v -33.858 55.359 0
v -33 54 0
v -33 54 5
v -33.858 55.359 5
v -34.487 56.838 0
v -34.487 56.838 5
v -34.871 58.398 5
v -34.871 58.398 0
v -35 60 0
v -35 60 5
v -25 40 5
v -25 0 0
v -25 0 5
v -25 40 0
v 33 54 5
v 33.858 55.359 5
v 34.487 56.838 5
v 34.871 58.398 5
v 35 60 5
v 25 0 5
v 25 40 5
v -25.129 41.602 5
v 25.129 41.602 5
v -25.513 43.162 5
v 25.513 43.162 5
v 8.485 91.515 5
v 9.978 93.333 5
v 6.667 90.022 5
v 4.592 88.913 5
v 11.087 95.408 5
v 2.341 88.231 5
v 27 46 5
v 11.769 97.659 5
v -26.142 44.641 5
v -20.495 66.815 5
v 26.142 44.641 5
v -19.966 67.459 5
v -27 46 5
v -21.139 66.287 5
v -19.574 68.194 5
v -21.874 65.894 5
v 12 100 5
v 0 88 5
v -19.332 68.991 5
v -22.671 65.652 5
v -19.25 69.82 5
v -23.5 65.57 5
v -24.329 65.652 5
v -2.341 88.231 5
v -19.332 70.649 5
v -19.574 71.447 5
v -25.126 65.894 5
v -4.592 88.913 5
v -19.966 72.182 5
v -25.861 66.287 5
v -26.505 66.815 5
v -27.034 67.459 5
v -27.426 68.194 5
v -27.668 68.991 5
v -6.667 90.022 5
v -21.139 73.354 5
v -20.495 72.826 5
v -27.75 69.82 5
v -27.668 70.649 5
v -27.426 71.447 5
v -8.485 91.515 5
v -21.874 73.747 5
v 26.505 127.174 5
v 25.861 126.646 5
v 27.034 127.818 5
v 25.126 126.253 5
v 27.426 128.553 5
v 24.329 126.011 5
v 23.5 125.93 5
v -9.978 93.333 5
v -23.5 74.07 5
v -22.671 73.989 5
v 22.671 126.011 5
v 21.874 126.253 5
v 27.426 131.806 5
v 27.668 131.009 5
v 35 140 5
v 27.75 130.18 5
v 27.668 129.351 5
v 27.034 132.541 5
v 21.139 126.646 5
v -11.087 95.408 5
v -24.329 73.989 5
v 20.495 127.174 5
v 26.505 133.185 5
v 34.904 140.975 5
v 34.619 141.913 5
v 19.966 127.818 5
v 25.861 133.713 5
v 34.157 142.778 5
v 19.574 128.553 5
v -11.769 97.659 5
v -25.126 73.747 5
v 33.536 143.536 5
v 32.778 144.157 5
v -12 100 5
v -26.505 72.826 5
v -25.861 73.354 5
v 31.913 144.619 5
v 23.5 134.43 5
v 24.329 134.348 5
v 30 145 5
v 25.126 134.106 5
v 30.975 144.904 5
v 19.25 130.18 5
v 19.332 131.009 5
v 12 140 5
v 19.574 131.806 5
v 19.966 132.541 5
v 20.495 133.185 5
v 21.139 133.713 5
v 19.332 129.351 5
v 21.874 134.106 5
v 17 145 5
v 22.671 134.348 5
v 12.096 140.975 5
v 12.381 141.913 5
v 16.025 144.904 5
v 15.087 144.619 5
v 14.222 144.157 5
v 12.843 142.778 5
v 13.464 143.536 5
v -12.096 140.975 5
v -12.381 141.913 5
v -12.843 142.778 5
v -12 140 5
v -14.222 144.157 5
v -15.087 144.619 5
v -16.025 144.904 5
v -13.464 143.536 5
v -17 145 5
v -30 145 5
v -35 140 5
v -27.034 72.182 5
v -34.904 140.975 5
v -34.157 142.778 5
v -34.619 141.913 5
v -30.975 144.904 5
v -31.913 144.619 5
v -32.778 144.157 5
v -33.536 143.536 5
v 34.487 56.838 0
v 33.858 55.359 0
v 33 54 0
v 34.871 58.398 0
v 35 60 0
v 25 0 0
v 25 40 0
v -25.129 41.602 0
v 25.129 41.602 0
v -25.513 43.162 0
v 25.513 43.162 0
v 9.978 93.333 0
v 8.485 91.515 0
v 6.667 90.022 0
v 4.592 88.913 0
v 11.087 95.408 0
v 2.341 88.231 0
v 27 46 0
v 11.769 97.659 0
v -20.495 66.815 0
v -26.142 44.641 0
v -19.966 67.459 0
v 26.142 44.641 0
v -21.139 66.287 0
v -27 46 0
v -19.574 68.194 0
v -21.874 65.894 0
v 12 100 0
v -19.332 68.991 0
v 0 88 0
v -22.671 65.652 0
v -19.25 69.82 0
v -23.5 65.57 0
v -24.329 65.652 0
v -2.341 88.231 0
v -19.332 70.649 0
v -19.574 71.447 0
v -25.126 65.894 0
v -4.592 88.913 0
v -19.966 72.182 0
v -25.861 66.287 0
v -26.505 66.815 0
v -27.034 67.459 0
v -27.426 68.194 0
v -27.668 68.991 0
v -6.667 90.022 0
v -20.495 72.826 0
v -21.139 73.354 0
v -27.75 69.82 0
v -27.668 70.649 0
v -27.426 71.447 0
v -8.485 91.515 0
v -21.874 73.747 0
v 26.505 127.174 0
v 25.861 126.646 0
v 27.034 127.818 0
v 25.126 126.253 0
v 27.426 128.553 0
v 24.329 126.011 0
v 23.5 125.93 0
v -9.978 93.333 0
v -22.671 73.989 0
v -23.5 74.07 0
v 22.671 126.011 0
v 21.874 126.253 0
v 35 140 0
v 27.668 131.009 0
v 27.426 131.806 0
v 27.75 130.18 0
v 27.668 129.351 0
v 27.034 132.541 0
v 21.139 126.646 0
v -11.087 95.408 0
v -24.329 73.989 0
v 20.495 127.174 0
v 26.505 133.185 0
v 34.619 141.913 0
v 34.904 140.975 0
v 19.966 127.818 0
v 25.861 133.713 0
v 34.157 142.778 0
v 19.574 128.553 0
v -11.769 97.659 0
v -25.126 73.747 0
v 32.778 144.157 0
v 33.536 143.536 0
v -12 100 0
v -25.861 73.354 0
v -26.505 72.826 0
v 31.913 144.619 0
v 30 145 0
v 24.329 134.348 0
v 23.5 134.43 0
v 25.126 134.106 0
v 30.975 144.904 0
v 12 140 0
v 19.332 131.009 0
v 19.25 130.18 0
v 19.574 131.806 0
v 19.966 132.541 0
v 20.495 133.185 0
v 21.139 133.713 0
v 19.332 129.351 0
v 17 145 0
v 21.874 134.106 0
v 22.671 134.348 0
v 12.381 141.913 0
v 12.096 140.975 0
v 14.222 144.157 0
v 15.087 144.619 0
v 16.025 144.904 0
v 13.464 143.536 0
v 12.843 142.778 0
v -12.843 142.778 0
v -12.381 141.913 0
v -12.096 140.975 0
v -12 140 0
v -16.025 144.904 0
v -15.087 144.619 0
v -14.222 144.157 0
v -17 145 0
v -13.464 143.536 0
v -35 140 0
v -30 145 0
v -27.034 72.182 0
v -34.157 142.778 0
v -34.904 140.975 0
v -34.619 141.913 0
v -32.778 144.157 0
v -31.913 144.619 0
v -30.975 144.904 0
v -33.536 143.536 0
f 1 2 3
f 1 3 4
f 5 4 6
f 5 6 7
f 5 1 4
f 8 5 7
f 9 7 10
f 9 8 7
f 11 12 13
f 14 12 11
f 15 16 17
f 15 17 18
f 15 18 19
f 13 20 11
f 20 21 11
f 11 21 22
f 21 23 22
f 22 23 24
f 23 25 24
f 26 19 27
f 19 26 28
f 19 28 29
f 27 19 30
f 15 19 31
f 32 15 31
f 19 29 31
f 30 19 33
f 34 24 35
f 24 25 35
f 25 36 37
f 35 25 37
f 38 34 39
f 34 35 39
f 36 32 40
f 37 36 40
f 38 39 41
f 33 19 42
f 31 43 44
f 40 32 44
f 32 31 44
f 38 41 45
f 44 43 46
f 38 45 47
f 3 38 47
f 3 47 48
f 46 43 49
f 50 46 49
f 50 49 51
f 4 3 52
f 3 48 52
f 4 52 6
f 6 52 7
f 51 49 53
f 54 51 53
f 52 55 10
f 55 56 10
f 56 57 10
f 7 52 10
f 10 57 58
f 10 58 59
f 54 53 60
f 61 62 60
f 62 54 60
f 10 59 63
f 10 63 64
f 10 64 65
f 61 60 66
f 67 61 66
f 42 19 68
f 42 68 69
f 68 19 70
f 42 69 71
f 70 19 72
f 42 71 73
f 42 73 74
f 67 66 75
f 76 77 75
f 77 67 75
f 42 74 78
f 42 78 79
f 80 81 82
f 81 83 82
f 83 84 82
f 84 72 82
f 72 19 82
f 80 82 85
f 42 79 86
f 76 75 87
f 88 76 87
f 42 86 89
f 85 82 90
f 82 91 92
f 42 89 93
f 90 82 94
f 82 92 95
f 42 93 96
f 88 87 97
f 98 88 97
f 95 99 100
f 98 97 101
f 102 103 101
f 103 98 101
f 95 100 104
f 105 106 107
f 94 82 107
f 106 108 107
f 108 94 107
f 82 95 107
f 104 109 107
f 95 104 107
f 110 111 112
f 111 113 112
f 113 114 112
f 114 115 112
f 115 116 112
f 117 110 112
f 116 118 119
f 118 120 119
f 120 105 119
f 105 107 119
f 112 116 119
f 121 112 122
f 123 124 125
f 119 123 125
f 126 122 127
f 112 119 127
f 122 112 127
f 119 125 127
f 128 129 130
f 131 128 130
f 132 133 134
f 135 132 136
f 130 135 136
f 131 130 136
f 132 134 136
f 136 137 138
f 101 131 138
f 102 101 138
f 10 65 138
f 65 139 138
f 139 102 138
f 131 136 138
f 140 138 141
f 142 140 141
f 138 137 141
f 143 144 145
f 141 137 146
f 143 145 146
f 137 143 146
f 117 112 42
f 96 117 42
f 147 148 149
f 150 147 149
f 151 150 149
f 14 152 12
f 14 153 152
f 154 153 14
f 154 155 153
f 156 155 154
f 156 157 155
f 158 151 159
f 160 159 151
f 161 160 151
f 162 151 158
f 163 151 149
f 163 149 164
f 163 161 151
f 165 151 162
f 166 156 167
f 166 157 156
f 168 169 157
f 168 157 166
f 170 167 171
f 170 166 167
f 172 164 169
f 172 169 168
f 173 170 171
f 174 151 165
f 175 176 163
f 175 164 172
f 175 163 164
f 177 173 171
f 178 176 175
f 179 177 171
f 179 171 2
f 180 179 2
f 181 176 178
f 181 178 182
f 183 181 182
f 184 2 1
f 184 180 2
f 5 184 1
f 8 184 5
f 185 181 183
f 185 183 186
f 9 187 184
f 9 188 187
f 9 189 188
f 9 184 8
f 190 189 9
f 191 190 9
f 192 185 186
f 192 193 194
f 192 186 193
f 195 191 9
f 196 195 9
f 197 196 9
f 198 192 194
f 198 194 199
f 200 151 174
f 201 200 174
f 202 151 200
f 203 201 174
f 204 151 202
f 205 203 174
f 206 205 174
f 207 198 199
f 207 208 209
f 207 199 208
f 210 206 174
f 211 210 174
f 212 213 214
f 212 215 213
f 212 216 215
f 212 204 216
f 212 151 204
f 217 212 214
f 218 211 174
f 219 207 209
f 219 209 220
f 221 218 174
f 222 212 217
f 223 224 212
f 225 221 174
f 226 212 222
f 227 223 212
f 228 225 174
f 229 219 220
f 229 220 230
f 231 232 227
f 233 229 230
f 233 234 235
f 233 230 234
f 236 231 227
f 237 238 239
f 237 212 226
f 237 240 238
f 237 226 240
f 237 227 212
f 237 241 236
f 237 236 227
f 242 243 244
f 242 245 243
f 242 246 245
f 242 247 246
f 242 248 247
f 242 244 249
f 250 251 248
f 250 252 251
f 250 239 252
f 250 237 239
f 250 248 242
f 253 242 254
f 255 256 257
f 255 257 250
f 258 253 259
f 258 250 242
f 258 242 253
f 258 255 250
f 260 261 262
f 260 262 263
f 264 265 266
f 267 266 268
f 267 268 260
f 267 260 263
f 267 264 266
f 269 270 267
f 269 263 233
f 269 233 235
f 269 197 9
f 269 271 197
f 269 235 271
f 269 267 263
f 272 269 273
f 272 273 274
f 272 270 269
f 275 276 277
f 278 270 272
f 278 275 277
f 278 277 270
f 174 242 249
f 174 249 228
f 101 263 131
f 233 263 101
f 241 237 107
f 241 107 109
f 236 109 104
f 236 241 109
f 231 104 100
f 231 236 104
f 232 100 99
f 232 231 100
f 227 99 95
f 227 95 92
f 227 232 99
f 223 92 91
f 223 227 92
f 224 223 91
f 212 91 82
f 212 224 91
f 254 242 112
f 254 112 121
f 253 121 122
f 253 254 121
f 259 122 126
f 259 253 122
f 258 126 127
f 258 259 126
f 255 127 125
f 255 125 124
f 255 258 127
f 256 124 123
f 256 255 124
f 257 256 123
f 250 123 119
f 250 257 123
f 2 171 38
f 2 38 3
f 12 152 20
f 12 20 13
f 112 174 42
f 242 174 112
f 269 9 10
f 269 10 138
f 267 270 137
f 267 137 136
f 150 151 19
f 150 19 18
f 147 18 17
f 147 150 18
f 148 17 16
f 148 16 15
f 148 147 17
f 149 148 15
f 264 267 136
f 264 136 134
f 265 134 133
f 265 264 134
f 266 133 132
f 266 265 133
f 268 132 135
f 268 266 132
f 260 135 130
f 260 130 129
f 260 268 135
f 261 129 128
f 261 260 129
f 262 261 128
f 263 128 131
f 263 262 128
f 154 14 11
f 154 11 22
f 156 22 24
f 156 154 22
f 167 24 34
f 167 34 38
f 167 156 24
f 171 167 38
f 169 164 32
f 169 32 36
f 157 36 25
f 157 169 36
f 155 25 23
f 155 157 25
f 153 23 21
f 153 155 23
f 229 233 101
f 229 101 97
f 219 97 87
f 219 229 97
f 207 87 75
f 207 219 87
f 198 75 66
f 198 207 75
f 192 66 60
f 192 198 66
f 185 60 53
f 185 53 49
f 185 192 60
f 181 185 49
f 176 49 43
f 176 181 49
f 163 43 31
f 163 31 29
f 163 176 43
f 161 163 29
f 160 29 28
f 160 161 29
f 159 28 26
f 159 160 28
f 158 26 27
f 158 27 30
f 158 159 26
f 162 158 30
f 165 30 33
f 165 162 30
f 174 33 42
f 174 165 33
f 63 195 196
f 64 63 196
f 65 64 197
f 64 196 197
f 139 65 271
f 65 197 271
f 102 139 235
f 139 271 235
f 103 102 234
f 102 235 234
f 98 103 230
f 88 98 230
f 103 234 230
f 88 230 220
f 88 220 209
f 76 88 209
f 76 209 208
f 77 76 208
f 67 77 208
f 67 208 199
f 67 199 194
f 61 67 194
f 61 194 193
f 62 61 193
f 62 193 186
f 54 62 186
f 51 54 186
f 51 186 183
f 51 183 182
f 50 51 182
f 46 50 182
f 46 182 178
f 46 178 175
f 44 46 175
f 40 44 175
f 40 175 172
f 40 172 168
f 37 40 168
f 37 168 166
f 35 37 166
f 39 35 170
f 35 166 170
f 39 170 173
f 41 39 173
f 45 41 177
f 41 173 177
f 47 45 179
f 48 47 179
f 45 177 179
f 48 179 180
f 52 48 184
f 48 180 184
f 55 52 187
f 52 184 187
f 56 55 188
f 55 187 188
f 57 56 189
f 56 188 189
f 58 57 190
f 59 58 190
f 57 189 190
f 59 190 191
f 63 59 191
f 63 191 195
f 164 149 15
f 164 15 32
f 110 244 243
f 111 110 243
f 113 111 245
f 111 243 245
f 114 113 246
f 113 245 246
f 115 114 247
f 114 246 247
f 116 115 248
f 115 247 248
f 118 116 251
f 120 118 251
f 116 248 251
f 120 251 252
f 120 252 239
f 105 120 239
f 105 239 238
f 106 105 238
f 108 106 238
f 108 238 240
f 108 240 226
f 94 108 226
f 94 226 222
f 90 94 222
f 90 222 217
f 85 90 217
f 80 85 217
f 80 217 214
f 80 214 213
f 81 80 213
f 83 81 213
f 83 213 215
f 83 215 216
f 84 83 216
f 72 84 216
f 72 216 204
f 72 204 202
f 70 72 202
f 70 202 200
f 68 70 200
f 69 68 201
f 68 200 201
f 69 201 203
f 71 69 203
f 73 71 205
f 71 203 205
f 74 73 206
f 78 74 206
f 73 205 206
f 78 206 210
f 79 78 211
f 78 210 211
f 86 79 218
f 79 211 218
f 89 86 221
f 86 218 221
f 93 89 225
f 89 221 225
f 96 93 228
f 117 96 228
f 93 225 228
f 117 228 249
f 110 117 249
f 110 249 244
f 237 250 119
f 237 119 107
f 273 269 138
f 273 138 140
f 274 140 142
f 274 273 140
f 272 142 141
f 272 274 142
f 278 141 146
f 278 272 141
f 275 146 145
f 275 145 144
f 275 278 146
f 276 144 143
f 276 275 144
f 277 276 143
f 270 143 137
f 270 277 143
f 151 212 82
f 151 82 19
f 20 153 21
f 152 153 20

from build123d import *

# Parameters (mm, degrees)
BOSS_EXTRUDE1_DEPTH      = 5
TAP_DRILL_FOR_M10_TAP1_D = 8.5


with BuildPart() as part:
    # Sketch1 → Boss-Extrude1 (new body)
    with BuildSketch(Plane.XY):
        with BuildLine():
            Line((25, 0), (-25, 0))
            Line((-25, 0), (-25, 40))
            ThreePointArc((-25, 40), (-25.513167019, 43.16227766), (-27, 46))
            Line((-27, 46), (-33, 54))
            ThreePointArc((-33, 54), (-34.486832981, 56.83772234), (-35, 60))
            Line((-35, 60), (-35, 140))
            ThreePointArc((-35, 140), (-33.535533906, 143.535533906), (-30, 145))
            Line((-30, 145), (-17, 145))
            ThreePointArc((-17, 145), (-13.464466094, 143.535533906), (-12, 140))
            Line((-12, 140), (-12, 100))
            ThreePointArc((-12, 100), (0, 88), (12, 100))
            Line((12, 100), (12, 140))
            ThreePointArc((12, 140), (13.464466094, 143.535533906), (17, 145))
            Line((17, 145), (30, 145))
            ThreePointArc((30, 145), (33.535533906, 143.535533906), (35, 140))
            Line((35, 140), (35, 60))
            ThreePointArc((35, 60), (34.486832981, 56.83772234), (33, 54))
            Line((33, 54), (27, 46))
            ThreePointArc((27, 46), (25.513167019, 43.16227766), (25, 40))
            Line((25, 40), (25, 0))
        make_face()
    extrude(amount=BOSS_EXTRUDE1_DEPTH)

    # Tap Drill for M10 Tap1 (through all)
    with Locations(Plane.XY.offset(5)):
        with Locations((23.5, 130.17967031), (-23.5, 69.82032969)):
            Hole(TAP_DRILL_FOR_M10_TAP1_D / 2)


solid = part.part
